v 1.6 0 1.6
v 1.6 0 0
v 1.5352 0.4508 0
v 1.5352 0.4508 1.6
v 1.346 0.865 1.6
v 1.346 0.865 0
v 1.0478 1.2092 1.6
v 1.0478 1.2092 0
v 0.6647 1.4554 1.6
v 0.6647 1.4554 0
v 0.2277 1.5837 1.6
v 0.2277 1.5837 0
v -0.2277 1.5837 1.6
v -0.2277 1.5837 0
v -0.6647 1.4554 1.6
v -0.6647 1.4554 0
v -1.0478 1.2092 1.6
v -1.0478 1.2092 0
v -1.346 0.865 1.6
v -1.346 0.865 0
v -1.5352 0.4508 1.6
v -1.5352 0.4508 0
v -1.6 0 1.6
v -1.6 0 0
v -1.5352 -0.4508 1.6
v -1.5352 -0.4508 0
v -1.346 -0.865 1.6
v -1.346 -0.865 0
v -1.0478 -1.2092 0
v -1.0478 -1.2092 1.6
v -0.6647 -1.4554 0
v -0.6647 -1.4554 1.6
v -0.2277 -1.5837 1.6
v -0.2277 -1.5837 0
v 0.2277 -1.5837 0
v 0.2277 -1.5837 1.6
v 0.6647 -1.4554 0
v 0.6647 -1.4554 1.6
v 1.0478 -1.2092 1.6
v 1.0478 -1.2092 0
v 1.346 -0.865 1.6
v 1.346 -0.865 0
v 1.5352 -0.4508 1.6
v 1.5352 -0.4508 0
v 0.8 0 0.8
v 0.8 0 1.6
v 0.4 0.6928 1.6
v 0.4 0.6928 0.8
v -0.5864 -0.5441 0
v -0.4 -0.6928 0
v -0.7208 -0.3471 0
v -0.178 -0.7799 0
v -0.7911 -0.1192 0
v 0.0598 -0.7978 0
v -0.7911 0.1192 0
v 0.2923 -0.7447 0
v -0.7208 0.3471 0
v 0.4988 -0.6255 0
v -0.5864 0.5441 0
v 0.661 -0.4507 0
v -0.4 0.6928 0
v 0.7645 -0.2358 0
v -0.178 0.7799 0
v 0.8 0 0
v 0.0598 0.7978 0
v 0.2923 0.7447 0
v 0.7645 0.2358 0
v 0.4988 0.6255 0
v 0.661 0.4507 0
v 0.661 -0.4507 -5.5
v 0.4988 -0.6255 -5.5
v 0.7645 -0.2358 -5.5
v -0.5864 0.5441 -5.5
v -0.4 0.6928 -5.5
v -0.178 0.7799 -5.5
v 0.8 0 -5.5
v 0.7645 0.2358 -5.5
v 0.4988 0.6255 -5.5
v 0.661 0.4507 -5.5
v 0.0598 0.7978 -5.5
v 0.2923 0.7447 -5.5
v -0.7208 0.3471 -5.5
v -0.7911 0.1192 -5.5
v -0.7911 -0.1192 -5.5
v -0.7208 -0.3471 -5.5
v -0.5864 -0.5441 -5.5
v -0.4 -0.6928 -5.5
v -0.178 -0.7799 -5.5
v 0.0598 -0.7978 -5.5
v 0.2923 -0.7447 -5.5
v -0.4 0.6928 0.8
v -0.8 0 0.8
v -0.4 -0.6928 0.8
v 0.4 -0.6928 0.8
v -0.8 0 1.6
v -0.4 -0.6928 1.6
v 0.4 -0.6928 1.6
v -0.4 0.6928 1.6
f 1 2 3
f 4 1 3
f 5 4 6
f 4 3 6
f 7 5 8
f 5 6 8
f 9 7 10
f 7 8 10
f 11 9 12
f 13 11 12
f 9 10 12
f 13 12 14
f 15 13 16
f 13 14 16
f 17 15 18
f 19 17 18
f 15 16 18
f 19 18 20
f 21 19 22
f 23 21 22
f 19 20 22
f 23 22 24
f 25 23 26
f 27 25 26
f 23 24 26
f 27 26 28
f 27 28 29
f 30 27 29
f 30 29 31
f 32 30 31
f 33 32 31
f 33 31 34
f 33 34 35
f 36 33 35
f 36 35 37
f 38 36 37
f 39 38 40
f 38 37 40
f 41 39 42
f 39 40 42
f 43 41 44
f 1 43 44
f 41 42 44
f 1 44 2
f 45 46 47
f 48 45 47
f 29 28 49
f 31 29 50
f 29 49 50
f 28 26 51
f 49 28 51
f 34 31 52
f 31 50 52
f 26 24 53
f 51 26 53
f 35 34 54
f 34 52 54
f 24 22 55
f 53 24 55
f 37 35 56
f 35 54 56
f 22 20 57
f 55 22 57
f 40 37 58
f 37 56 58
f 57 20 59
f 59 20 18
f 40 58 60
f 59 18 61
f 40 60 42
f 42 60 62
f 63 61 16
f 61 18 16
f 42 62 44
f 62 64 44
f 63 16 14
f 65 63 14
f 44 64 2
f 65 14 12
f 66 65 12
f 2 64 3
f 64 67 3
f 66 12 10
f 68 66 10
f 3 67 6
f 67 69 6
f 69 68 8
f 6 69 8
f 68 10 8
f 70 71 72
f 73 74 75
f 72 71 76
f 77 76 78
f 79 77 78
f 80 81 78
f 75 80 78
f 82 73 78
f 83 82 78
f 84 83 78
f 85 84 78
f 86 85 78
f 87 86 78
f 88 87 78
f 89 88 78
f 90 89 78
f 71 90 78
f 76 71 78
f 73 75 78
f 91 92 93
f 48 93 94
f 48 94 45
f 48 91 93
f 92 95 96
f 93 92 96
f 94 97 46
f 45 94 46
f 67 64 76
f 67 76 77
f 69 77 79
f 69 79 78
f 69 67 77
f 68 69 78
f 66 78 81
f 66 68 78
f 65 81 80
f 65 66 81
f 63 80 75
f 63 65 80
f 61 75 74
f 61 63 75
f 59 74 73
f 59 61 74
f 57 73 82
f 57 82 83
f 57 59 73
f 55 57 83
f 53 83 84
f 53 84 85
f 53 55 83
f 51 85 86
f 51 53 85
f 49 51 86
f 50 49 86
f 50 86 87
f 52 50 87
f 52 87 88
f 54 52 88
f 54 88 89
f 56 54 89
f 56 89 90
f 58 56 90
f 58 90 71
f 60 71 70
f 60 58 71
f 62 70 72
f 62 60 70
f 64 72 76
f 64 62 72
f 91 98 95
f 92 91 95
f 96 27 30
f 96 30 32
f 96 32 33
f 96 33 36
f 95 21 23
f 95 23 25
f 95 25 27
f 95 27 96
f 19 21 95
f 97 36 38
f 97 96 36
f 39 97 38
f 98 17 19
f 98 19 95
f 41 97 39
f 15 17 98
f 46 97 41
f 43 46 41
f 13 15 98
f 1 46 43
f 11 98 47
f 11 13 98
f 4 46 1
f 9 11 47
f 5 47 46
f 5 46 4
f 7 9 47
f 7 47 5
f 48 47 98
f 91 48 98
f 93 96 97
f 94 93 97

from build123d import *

# Parameters (mm, degrees)
SKETCH_1_R          = 1.6
EXTRUDE_1_DEPTH     = 1.6
SKETCH_3_R          = 0.8
EXTRUDE_3_DEPTH     = 5.5
CUT_EXTRUDE_1_DEPTH = 0.8


with BuildPart() as part:
    # 草图1 → 凸台-拉伸1 (new body)
    with BuildSketch(Plane.XY):
        Circle(SKETCH_1_R)
    extrude(amount=EXTRUDE_1_DEPTH)

    # 草图3 → 凸台-拉伸3 (add)
    with BuildSketch(Plane.XY):
        Circle(SKETCH_3_R)
    extrude(amount=-EXTRUDE_3_DEPTH)

    # 草图4 → 切除-拉伸1 (cut)
    with BuildSketch(Plane.XY.offset(1.6)):
        Polygon((0.8, 0), (0.4, 0.692820323), (-0.4, 0.692820323), (-0.8, 0), (-0.4, -0.692820323), (0.4, -0.692820323), align=None)
    extrude(amount=-CUT_EXTRUDE_1_DEPTH, mode=Mode.SUBTRACT)


solid = part.part
